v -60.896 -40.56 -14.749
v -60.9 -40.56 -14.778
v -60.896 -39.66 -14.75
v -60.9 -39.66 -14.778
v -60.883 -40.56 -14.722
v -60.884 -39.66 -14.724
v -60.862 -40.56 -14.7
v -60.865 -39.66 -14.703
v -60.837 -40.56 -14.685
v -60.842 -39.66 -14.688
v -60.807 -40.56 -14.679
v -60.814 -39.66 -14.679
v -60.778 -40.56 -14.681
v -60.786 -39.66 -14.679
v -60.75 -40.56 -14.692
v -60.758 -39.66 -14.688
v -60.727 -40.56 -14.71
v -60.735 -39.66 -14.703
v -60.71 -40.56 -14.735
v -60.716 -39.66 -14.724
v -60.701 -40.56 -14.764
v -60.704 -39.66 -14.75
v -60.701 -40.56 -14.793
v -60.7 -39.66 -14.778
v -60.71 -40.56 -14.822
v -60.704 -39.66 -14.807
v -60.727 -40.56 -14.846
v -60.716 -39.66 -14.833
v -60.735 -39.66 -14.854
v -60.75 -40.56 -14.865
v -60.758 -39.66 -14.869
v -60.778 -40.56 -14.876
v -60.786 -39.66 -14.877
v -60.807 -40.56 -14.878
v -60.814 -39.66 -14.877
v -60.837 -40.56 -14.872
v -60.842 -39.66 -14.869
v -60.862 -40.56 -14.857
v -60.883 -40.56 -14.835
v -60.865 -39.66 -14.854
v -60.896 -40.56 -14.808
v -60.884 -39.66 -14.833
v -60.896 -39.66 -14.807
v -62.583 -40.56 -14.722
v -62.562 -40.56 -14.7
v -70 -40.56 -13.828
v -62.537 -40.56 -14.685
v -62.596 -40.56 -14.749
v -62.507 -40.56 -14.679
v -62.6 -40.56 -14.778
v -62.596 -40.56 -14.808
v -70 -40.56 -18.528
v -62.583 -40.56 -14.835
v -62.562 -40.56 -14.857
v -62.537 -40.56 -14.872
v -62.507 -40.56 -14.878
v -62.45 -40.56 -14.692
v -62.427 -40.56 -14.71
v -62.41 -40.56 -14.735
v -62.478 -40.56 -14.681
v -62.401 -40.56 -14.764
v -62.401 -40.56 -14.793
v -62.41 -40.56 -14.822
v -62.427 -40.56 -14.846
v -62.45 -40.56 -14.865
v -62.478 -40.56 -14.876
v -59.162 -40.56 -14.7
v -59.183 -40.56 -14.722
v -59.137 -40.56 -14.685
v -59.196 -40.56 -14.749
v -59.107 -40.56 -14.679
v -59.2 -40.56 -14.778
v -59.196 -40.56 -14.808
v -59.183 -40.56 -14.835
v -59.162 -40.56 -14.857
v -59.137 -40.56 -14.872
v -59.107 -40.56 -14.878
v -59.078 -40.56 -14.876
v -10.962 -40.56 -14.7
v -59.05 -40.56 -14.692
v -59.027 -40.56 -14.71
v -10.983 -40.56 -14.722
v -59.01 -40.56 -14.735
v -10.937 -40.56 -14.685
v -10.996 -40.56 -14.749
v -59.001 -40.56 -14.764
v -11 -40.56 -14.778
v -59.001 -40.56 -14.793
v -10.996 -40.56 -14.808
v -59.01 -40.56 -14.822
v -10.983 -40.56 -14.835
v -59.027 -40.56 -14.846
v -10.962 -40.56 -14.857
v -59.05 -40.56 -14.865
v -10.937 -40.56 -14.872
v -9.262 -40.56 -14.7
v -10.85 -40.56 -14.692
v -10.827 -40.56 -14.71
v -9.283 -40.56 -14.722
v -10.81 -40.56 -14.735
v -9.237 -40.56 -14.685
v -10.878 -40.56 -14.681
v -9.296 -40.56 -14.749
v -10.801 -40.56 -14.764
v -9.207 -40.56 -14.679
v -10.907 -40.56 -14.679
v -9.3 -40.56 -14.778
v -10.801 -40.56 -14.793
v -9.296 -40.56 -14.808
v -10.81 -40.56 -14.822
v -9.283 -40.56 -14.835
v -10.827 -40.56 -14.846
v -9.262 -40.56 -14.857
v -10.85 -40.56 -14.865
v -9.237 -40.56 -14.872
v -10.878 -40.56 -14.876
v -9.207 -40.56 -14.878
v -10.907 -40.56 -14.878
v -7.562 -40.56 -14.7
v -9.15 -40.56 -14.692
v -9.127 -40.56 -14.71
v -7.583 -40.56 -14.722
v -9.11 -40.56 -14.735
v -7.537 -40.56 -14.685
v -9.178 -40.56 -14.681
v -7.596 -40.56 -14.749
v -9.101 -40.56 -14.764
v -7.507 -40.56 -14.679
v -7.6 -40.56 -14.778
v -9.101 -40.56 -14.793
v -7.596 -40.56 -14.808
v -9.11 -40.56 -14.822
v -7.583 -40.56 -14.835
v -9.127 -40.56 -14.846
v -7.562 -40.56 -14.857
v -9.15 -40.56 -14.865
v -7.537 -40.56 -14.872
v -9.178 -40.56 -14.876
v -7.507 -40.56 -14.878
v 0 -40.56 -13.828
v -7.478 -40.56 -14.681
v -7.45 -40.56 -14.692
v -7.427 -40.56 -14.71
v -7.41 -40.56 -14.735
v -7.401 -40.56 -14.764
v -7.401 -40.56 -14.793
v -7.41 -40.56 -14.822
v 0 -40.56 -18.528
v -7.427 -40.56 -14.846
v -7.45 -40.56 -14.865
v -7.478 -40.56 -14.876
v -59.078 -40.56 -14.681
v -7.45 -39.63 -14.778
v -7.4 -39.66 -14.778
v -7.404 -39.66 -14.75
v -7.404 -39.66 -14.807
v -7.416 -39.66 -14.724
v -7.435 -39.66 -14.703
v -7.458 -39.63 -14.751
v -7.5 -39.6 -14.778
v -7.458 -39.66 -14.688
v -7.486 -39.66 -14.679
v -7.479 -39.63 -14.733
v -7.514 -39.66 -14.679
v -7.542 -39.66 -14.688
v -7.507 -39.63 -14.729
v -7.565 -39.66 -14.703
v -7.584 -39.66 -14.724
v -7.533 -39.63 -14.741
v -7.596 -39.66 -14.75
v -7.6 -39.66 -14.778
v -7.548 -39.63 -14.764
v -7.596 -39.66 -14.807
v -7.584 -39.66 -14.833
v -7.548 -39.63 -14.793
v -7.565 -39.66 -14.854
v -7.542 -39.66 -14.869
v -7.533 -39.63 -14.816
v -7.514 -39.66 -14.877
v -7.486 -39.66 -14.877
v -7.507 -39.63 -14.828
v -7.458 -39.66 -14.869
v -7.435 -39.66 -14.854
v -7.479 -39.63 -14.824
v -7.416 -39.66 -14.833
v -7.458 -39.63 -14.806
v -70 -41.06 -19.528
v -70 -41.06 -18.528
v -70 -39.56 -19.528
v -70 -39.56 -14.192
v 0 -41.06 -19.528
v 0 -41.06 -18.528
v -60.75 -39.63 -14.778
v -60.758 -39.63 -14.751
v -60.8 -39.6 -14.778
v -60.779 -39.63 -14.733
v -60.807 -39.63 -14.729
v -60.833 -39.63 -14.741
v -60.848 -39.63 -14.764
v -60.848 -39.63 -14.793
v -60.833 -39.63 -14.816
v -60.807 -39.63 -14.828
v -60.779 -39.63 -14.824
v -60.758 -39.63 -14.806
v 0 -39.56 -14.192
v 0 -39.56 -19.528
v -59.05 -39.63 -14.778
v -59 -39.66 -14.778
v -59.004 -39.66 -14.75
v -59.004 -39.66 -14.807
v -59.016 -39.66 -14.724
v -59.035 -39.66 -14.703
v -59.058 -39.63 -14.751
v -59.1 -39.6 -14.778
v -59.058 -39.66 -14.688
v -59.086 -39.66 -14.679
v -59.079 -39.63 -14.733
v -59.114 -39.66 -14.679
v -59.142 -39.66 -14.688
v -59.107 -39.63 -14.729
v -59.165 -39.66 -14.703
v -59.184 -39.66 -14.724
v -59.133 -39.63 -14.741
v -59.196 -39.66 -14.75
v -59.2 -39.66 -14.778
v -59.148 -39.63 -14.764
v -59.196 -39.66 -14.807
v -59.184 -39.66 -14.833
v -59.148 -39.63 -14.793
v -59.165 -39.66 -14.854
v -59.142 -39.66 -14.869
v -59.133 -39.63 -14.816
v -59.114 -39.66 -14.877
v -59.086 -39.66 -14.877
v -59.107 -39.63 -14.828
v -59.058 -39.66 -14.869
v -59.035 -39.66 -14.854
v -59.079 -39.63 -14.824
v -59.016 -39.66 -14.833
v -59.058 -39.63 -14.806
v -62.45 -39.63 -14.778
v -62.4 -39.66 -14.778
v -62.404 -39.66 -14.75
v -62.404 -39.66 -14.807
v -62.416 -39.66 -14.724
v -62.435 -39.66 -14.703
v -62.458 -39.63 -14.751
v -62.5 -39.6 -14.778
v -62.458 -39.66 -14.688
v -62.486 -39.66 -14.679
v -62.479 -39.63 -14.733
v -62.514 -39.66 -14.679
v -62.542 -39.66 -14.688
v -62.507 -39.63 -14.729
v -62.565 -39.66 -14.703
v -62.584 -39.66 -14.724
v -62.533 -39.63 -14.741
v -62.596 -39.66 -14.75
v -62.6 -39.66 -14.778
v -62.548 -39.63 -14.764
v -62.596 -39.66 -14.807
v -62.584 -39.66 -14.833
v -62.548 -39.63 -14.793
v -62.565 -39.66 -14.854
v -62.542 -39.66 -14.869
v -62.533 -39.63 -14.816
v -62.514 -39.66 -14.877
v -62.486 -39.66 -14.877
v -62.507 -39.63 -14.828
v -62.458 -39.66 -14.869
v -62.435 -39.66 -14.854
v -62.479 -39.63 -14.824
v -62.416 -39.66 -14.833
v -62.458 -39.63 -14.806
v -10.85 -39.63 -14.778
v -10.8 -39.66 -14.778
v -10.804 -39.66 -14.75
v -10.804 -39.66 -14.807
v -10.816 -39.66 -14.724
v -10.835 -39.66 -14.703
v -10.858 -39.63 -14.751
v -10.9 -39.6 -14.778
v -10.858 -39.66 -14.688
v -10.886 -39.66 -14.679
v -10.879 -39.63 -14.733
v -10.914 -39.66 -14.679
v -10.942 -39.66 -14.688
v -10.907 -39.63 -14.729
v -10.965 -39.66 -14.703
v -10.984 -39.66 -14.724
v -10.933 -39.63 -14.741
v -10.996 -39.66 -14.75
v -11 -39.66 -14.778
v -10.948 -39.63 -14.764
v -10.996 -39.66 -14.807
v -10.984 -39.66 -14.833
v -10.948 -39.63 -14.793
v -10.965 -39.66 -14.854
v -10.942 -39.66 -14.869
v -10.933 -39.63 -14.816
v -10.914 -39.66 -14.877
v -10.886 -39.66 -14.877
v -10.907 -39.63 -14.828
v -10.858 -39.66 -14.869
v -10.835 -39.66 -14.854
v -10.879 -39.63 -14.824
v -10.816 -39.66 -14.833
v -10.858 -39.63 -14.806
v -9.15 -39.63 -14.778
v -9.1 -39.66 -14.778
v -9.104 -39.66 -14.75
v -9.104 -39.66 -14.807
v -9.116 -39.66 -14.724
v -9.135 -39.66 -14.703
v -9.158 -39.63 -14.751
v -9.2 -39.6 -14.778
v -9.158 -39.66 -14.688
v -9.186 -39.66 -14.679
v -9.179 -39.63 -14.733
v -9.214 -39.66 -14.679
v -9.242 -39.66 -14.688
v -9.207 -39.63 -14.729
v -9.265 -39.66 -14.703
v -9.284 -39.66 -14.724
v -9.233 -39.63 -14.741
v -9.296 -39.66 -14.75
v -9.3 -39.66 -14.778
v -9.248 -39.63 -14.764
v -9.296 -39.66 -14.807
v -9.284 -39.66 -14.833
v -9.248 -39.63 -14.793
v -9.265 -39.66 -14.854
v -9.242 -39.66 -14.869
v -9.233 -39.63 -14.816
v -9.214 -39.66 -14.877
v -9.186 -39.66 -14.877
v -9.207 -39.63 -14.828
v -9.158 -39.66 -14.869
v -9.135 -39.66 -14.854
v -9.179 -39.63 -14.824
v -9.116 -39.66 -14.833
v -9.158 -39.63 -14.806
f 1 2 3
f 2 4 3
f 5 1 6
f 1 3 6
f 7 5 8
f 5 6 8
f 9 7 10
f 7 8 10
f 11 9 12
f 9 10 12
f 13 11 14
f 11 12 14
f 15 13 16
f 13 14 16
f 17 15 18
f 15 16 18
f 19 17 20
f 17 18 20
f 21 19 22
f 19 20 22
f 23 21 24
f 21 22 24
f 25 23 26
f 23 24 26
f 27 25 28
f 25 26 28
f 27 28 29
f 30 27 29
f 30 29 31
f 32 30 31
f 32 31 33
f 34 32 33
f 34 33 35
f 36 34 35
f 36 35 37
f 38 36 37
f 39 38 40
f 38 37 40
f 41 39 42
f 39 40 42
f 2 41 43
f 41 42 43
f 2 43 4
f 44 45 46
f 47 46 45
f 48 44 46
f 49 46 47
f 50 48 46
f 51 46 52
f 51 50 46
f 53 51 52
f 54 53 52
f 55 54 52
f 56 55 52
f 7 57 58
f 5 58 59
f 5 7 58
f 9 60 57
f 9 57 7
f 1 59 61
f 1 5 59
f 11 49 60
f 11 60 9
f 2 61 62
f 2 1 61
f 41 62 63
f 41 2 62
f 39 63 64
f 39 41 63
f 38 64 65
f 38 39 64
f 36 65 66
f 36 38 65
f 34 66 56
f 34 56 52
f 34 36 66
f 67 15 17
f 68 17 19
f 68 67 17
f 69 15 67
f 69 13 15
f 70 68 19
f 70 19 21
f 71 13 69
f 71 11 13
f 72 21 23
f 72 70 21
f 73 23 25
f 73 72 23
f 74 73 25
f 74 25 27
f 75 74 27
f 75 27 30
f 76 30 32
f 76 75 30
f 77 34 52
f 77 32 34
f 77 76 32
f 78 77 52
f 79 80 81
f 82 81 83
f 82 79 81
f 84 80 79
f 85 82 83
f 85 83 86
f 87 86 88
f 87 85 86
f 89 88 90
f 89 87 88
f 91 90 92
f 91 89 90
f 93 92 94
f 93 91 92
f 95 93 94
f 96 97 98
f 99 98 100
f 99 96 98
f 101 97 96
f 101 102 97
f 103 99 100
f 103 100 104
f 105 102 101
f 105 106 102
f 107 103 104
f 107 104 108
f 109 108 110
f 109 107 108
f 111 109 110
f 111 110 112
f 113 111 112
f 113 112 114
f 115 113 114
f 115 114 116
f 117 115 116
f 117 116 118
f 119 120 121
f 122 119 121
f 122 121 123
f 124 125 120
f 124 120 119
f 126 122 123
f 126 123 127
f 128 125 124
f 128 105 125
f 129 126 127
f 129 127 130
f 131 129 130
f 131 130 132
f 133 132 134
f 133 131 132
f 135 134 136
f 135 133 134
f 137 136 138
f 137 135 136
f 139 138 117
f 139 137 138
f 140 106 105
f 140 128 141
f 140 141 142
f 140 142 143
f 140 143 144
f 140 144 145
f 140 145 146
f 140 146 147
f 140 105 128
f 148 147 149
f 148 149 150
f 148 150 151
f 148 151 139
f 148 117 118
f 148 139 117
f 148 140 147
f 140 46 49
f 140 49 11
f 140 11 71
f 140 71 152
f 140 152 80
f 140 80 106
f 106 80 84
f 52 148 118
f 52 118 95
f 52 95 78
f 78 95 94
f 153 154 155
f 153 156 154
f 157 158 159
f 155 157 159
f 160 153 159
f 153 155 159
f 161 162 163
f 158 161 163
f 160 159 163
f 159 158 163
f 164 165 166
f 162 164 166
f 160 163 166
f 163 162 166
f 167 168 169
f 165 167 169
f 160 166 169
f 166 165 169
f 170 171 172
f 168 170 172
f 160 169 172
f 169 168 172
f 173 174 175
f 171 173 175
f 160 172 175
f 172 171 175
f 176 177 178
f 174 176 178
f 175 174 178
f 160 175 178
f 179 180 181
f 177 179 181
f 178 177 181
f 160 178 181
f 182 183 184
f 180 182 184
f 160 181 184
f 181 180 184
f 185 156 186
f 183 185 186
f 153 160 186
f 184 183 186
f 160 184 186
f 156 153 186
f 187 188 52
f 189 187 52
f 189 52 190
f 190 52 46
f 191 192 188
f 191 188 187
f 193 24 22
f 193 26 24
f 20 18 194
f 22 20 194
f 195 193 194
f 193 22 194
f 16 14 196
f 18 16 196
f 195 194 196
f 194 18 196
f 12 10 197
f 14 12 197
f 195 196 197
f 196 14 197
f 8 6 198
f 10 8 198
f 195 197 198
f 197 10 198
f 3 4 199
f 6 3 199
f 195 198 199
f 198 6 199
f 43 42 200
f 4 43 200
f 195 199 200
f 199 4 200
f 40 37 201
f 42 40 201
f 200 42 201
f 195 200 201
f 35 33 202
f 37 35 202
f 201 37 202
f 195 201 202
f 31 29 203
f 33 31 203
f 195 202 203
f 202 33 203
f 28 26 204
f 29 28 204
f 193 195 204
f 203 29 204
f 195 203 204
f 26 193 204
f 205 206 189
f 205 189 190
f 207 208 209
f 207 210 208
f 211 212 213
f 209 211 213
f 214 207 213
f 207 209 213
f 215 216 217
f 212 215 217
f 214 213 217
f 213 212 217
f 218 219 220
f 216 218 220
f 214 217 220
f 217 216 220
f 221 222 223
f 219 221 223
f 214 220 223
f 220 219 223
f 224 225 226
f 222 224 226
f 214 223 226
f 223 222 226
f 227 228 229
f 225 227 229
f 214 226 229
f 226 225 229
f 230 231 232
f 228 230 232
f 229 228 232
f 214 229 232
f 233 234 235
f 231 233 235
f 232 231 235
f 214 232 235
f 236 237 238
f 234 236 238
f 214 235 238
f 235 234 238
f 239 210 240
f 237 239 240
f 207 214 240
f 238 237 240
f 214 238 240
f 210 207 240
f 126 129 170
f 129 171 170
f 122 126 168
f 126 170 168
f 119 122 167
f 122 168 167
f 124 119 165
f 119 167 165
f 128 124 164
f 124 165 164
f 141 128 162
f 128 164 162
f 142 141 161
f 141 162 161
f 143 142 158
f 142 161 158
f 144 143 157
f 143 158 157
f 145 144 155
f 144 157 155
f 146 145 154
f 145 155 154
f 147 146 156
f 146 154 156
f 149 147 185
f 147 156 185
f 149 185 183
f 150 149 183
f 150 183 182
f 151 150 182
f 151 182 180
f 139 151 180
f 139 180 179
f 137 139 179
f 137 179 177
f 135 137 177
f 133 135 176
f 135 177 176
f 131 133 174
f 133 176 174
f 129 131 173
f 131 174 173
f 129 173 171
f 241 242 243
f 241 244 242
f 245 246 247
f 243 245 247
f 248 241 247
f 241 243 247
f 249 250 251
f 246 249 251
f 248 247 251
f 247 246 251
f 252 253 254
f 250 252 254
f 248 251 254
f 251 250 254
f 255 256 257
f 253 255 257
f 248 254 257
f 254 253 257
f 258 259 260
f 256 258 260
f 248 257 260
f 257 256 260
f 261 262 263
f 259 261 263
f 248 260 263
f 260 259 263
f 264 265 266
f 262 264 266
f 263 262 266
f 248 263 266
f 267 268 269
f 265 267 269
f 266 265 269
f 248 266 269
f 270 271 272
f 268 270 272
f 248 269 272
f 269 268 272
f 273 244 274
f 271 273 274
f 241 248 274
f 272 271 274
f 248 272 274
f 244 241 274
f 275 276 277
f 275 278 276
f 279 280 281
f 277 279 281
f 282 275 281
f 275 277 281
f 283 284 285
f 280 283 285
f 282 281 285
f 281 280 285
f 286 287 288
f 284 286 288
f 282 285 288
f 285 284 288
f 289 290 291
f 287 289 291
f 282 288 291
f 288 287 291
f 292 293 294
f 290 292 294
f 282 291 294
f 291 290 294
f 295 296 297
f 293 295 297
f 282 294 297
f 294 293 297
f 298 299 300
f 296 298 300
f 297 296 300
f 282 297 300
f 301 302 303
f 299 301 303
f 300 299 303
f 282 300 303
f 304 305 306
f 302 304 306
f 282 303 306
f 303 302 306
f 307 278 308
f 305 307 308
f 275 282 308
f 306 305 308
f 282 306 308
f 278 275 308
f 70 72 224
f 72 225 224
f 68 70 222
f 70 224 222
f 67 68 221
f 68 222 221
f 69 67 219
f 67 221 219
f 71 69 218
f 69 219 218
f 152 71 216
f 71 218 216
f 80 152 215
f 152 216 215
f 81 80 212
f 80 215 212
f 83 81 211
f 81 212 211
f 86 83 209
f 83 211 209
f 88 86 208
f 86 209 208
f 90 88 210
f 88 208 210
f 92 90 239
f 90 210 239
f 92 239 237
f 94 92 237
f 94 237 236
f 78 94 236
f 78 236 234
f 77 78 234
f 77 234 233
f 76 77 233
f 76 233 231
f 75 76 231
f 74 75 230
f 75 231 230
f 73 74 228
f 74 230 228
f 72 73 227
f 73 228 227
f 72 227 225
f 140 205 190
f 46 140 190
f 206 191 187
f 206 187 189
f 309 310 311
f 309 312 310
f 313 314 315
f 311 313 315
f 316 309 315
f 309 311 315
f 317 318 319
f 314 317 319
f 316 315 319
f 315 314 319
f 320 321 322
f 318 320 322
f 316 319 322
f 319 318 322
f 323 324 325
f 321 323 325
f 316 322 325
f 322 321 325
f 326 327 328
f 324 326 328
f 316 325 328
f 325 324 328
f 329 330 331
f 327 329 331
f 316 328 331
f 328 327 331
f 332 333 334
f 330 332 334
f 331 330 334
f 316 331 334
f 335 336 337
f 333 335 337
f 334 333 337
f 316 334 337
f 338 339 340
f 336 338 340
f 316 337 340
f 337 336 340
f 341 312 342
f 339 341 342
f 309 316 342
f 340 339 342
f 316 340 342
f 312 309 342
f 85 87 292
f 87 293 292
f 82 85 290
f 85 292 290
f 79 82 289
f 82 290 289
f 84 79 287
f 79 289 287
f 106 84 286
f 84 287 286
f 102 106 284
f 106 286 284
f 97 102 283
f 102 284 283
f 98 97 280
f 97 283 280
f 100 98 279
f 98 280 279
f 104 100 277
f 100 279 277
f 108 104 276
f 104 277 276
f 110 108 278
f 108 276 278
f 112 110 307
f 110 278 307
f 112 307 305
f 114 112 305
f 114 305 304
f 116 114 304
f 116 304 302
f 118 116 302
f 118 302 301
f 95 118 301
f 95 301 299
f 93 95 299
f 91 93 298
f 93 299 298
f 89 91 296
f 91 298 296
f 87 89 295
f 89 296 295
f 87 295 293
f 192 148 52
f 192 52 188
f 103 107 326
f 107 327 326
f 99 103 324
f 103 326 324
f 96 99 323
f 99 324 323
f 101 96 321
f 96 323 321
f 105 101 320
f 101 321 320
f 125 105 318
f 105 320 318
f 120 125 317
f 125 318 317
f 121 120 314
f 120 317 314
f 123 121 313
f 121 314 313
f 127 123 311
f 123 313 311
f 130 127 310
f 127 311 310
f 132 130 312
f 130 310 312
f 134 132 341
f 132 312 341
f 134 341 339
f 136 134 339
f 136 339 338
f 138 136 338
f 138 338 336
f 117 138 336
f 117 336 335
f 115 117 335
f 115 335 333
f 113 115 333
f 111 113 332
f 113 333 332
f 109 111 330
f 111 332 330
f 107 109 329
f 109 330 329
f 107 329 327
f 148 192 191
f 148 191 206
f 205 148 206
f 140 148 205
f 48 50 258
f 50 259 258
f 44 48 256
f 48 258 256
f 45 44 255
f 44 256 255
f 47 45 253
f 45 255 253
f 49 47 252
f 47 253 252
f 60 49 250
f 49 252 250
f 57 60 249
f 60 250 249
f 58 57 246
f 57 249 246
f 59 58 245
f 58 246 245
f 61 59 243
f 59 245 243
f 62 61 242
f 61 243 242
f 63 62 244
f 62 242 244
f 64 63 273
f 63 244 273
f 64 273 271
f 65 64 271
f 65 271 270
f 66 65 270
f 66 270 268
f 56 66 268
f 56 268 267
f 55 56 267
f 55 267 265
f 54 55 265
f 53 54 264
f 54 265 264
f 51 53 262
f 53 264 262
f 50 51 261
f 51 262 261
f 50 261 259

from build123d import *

# Parameters (mm, degrees)
F1_DEPTH = 70
F2_SIZE2 = 0.36396
F2_SIZE  = 0.99999
F4_D     = 0.2
F4_DEPTH = 0.9
F4_TIP   = 0.0600860619


# Not quite as in the source:
# - a fillet or chamfer is up to 0.001 mm smaller than in the source, because OpenCascade refuses the exact size


with BuildPart() as f1:
    # F0 (on Right) → F1 (new body)
    with BuildSketch(Plane.YZ):
        Polygon((-39.5598503354, -13.8284793004), (-40.5598503354, -13.8284793004), (-40.5598503354, -18.5284793004), (-41.0598503354, -18.5284793004), (-41.0598503354, -19.5284793004), (-39.5598503354, -19.5284793004), align=None)
    extrude(amount=-F1_DEPTH)

    # F2 (size 1 and 0.3639702343 in the source; OpenCascade refuses exactly that, so slightly less here)
    f2_edges = [f1.edges().sort_by_distance(p)[0] for p in [
        (-35, -39.55985, -13.828479),
    ]]
    f2_side = f1.faces().sort_by_distance((-35, -40.05985, -13.828479))[0]
    chamfer(f2_edges, length=F2_SIZE, length2=F2_SIZE2, reference=f2_side)

    # F4
    with Locations(Plane.XZ.offset(40.5598503354)):
        with Locations((-62.5, -14.7784793004), (-60.8, -14.7784793004), (-59.1, -14.7784793004), (-10.9, -14.7784793004), (-9.2, -14.7784793004), (-7.5, -14.7784793004)):
            Hole(F4_D / 2, depth=F4_DEPTH)
            with Locations((0, 0, -(F4_DEPTH + F4_TIP / 2))):  # 118° drill point
                Cone(0, F4_D / 2, F4_TIP, mode=Mode.SUBTRACT)


solid = f1.part
